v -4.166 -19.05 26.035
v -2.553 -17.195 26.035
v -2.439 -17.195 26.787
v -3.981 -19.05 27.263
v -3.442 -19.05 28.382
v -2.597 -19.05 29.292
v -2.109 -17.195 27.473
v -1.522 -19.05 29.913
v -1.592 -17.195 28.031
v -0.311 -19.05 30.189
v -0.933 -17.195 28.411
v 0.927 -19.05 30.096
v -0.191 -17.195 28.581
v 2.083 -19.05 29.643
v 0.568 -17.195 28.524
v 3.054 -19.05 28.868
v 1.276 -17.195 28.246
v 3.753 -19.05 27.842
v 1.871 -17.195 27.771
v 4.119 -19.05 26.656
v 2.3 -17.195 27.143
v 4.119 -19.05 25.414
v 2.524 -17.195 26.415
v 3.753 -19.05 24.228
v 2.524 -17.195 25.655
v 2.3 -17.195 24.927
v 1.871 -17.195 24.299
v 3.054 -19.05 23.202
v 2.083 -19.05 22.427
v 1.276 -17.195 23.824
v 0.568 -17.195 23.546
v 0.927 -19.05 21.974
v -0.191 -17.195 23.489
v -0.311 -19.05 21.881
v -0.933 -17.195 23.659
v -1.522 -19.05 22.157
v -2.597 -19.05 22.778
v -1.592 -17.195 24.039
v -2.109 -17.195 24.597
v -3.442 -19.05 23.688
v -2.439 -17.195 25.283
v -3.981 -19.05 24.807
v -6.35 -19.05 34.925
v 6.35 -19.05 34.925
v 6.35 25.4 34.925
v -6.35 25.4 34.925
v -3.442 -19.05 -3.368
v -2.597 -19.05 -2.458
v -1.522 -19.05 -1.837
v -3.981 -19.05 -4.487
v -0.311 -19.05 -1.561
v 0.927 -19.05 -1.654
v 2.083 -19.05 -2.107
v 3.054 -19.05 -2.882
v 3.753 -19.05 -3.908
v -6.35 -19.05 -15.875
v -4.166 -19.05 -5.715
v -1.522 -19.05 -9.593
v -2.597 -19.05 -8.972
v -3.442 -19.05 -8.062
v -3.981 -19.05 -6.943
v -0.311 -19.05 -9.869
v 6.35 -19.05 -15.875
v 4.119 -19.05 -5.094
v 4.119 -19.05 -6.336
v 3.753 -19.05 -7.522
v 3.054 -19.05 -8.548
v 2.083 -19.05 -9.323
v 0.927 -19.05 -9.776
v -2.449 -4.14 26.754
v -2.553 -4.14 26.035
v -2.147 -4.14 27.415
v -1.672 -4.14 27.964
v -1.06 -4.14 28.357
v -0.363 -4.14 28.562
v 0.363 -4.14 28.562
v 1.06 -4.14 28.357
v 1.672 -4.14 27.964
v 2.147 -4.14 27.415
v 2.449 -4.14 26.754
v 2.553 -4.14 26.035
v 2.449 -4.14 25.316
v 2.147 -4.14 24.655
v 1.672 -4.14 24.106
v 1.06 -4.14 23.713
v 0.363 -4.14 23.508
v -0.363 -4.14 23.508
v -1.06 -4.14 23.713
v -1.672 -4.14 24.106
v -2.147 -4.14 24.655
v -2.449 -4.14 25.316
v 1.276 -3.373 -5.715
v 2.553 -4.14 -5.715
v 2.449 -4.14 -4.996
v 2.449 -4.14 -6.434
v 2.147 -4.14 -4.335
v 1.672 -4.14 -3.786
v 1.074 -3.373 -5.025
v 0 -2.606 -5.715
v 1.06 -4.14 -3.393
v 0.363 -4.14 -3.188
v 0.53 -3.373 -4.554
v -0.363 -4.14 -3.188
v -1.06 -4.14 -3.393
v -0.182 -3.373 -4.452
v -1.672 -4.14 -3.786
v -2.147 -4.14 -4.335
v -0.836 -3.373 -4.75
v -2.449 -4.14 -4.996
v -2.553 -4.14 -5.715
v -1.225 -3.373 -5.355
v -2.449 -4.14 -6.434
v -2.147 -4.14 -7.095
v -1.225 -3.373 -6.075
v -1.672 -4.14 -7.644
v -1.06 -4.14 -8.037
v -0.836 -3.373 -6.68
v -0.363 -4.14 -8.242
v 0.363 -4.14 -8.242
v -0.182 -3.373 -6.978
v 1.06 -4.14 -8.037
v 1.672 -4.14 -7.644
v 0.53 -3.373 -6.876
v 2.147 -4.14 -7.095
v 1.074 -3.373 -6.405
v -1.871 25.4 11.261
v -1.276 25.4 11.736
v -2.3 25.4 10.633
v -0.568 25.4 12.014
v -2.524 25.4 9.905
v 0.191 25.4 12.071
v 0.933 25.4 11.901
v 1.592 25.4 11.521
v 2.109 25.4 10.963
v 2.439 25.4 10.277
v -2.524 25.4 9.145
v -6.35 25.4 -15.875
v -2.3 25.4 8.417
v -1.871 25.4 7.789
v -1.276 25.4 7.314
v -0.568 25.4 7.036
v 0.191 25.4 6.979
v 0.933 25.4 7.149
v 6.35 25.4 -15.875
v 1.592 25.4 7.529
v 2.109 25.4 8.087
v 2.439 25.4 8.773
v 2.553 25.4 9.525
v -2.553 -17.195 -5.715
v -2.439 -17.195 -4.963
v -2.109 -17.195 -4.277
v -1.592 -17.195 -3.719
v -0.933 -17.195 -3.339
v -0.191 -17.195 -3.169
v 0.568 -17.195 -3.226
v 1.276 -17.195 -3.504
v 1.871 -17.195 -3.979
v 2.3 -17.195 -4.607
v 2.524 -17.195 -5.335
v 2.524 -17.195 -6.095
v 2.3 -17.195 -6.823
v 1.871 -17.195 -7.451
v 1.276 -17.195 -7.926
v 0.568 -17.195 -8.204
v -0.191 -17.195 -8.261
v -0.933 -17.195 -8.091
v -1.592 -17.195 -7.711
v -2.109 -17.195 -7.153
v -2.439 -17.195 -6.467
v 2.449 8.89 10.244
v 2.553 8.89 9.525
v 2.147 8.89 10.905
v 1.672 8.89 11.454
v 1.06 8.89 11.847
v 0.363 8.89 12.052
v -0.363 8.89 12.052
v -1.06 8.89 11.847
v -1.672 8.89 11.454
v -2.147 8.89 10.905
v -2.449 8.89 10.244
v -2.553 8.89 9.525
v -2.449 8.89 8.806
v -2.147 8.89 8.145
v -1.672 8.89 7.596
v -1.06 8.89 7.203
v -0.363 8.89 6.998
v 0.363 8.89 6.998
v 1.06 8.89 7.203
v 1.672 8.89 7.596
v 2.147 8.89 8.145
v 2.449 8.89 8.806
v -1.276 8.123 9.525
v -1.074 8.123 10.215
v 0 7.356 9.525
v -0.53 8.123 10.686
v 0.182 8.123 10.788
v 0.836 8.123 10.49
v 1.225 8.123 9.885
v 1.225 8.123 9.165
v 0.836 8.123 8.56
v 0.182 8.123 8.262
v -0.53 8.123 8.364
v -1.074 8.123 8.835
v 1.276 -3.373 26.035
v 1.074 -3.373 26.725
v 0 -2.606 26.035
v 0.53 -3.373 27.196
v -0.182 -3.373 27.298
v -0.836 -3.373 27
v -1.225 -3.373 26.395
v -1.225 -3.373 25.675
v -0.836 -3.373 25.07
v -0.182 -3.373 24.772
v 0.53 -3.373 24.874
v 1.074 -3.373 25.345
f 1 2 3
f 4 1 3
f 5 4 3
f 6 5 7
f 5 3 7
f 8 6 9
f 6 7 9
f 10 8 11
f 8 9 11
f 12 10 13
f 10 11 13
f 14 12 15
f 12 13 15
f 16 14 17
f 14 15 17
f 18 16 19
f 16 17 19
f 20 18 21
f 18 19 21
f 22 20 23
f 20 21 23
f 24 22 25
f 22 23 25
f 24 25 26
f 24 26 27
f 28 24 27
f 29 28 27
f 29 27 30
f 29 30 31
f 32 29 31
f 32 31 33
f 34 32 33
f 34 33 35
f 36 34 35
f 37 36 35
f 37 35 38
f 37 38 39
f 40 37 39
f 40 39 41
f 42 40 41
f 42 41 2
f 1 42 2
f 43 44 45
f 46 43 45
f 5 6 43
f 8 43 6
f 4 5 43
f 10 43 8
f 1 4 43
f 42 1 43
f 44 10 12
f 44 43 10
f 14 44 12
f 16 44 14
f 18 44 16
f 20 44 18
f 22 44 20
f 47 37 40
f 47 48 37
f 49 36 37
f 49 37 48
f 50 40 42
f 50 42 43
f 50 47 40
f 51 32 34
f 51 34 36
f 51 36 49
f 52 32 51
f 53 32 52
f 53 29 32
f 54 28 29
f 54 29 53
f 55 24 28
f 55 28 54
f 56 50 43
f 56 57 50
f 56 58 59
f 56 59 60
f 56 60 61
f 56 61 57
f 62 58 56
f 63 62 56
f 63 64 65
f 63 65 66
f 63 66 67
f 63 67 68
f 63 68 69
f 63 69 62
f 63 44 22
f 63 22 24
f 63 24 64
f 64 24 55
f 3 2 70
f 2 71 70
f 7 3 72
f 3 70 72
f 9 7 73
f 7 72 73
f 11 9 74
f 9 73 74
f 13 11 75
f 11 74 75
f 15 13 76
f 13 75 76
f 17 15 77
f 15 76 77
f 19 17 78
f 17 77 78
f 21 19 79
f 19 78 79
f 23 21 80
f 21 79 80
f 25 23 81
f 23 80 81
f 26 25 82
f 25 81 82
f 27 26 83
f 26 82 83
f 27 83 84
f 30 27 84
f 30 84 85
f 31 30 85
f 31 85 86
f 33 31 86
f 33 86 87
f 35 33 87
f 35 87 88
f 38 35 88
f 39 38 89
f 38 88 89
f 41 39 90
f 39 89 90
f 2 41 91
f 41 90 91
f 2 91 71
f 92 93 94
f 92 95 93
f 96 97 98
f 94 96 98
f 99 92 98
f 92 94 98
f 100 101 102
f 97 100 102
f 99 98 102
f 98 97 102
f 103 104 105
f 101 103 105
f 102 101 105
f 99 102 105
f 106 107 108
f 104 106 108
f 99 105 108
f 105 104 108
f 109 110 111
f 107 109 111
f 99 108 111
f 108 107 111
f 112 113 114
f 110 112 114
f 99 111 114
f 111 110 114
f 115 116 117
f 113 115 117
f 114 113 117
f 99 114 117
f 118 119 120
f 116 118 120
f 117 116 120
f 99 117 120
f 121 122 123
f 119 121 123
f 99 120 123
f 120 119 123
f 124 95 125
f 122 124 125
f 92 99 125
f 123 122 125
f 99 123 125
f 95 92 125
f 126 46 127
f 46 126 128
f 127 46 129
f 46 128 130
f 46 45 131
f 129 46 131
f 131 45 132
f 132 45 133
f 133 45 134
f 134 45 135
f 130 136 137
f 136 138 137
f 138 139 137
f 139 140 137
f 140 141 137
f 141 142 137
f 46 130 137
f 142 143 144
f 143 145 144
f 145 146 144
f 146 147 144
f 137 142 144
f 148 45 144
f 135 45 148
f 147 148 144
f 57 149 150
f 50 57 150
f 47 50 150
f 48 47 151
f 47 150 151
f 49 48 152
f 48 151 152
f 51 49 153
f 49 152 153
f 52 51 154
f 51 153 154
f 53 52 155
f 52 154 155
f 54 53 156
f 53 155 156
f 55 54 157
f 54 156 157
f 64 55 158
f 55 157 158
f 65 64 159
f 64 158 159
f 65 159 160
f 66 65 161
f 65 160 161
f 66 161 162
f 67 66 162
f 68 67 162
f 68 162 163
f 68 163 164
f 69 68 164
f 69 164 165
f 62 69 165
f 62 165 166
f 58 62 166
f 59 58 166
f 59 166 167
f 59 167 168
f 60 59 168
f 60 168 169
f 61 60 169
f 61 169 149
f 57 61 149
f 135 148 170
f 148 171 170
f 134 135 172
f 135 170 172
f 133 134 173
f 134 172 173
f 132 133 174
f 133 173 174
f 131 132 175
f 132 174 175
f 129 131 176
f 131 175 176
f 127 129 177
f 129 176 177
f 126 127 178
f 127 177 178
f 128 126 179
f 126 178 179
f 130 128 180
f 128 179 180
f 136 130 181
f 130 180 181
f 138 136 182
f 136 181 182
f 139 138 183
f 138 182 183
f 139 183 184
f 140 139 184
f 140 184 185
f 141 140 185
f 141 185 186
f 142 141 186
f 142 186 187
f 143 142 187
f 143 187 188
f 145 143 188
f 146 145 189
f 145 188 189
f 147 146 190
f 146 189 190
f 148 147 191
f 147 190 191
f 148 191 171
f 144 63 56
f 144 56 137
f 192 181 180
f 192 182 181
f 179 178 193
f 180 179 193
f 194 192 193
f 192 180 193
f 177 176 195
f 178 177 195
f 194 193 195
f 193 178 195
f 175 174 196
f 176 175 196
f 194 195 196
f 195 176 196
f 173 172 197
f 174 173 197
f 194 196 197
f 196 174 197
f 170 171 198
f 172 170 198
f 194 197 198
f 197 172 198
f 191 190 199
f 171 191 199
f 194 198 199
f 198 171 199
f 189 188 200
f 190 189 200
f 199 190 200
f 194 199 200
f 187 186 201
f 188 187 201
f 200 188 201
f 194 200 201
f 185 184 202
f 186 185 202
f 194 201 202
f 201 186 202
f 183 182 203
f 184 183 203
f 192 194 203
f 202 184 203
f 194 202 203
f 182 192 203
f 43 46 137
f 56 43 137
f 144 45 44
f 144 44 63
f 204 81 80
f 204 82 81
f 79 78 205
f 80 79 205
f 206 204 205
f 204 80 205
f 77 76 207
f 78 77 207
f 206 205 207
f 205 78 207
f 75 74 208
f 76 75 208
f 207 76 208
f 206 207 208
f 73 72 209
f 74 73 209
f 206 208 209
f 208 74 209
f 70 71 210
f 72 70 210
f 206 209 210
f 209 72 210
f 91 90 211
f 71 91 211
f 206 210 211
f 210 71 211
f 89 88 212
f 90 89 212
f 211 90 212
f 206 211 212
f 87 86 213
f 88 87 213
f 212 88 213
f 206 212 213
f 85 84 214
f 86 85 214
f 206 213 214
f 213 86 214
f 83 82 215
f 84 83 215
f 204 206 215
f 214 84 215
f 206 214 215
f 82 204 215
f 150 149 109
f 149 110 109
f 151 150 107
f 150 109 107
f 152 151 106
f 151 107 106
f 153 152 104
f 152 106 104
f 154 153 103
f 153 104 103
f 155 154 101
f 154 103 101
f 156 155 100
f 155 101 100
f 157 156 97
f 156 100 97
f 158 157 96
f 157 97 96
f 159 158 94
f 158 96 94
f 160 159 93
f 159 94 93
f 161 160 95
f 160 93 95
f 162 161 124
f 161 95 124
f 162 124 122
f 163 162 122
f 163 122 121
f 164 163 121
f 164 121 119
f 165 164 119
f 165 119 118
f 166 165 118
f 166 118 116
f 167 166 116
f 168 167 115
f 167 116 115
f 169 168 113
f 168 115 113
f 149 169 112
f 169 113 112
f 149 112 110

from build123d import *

# Parameters (mm, degrees)
SKETCH1_W                         = 50.8
SKETCH1_H                         = 44.45
EXTRUDE1_DEPTH                    = 6.35
F_1_4_20_TAPPED_HOLE1_D           = 5.1054
F_1_4_20_TAPPED_HOLE1_DEPTH       = 14.9098
F_1_4_20_TAPPED_HOLE1_CSINK_D     = 8.3312
F_1_4_20_TAPPED_HOLE1_CSINK_ANGLE = 82
F_1_4_20_TAPPED_HOLE1_TIP         = 1.533816902
F_1_4_20_TAPPED_HOLE2_D           = 5.1054
F_1_4_20_TAPPED_HOLE2_DEPTH       = 16.51
F_1_4_20_TAPPED_HOLE2_TIP         = 1.533816902


with BuildPart() as part:
    # Sketch1 → Extrude1 (new, symmetric)
    with BuildSketch(Plane(origin=(0, 0, 0), x_dir=(0, 0, -1), z_dir=(1, 0, 0))):
        with Locations((-9.525, 3.175)):
            Rectangle(SKETCH1_W, SKETCH1_H)
    extrude(amount=EXTRUDE1_DEPTH, both=True)

    # 1/4-20 Tapped Hole1
    with Locations(Plane.XZ.offset(19.05)):
        with Locations((0, 26.035), (0, -5.715)):
            CounterSinkHole(F_1_4_20_TAPPED_HOLE1_D / 2, F_1_4_20_TAPPED_HOLE1_CSINK_D / 2, depth=F_1_4_20_TAPPED_HOLE1_DEPTH, counter_sink_angle=F_1_4_20_TAPPED_HOLE1_CSINK_ANGLE)
            with Locations((0, 0, -(F_1_4_20_TAPPED_HOLE1_DEPTH + F_1_4_20_TAPPED_HOLE1_TIP / 2))):  # 118° drill point
                Cone(0, F_1_4_20_TAPPED_HOLE1_D / 2, F_1_4_20_TAPPED_HOLE1_TIP, mode=Mode.SUBTRACT)

    # 1/4-20 Tapped Hole2
    with Locations(Plane(origin=(0, 25.4, 0), x_dir=(-1, 0, 0), z_dir=(0, 1, 0))):
        with Locations((0, 9.525)):
            Hole(F_1_4_20_TAPPED_HOLE2_D / 2, depth=F_1_4_20_TAPPED_HOLE2_DEPTH)
            with Locations((0, 0, -(F_1_4_20_TAPPED_HOLE2_DEPTH + F_1_4_20_TAPPED_HOLE2_TIP / 2))):  # 118° drill point
                Cone(0, F_1_4_20_TAPPED_HOLE2_D / 2, F_1_4_20_TAPPED_HOLE2_TIP, mode=Mode.SUBTRACT)


solid = part.part
